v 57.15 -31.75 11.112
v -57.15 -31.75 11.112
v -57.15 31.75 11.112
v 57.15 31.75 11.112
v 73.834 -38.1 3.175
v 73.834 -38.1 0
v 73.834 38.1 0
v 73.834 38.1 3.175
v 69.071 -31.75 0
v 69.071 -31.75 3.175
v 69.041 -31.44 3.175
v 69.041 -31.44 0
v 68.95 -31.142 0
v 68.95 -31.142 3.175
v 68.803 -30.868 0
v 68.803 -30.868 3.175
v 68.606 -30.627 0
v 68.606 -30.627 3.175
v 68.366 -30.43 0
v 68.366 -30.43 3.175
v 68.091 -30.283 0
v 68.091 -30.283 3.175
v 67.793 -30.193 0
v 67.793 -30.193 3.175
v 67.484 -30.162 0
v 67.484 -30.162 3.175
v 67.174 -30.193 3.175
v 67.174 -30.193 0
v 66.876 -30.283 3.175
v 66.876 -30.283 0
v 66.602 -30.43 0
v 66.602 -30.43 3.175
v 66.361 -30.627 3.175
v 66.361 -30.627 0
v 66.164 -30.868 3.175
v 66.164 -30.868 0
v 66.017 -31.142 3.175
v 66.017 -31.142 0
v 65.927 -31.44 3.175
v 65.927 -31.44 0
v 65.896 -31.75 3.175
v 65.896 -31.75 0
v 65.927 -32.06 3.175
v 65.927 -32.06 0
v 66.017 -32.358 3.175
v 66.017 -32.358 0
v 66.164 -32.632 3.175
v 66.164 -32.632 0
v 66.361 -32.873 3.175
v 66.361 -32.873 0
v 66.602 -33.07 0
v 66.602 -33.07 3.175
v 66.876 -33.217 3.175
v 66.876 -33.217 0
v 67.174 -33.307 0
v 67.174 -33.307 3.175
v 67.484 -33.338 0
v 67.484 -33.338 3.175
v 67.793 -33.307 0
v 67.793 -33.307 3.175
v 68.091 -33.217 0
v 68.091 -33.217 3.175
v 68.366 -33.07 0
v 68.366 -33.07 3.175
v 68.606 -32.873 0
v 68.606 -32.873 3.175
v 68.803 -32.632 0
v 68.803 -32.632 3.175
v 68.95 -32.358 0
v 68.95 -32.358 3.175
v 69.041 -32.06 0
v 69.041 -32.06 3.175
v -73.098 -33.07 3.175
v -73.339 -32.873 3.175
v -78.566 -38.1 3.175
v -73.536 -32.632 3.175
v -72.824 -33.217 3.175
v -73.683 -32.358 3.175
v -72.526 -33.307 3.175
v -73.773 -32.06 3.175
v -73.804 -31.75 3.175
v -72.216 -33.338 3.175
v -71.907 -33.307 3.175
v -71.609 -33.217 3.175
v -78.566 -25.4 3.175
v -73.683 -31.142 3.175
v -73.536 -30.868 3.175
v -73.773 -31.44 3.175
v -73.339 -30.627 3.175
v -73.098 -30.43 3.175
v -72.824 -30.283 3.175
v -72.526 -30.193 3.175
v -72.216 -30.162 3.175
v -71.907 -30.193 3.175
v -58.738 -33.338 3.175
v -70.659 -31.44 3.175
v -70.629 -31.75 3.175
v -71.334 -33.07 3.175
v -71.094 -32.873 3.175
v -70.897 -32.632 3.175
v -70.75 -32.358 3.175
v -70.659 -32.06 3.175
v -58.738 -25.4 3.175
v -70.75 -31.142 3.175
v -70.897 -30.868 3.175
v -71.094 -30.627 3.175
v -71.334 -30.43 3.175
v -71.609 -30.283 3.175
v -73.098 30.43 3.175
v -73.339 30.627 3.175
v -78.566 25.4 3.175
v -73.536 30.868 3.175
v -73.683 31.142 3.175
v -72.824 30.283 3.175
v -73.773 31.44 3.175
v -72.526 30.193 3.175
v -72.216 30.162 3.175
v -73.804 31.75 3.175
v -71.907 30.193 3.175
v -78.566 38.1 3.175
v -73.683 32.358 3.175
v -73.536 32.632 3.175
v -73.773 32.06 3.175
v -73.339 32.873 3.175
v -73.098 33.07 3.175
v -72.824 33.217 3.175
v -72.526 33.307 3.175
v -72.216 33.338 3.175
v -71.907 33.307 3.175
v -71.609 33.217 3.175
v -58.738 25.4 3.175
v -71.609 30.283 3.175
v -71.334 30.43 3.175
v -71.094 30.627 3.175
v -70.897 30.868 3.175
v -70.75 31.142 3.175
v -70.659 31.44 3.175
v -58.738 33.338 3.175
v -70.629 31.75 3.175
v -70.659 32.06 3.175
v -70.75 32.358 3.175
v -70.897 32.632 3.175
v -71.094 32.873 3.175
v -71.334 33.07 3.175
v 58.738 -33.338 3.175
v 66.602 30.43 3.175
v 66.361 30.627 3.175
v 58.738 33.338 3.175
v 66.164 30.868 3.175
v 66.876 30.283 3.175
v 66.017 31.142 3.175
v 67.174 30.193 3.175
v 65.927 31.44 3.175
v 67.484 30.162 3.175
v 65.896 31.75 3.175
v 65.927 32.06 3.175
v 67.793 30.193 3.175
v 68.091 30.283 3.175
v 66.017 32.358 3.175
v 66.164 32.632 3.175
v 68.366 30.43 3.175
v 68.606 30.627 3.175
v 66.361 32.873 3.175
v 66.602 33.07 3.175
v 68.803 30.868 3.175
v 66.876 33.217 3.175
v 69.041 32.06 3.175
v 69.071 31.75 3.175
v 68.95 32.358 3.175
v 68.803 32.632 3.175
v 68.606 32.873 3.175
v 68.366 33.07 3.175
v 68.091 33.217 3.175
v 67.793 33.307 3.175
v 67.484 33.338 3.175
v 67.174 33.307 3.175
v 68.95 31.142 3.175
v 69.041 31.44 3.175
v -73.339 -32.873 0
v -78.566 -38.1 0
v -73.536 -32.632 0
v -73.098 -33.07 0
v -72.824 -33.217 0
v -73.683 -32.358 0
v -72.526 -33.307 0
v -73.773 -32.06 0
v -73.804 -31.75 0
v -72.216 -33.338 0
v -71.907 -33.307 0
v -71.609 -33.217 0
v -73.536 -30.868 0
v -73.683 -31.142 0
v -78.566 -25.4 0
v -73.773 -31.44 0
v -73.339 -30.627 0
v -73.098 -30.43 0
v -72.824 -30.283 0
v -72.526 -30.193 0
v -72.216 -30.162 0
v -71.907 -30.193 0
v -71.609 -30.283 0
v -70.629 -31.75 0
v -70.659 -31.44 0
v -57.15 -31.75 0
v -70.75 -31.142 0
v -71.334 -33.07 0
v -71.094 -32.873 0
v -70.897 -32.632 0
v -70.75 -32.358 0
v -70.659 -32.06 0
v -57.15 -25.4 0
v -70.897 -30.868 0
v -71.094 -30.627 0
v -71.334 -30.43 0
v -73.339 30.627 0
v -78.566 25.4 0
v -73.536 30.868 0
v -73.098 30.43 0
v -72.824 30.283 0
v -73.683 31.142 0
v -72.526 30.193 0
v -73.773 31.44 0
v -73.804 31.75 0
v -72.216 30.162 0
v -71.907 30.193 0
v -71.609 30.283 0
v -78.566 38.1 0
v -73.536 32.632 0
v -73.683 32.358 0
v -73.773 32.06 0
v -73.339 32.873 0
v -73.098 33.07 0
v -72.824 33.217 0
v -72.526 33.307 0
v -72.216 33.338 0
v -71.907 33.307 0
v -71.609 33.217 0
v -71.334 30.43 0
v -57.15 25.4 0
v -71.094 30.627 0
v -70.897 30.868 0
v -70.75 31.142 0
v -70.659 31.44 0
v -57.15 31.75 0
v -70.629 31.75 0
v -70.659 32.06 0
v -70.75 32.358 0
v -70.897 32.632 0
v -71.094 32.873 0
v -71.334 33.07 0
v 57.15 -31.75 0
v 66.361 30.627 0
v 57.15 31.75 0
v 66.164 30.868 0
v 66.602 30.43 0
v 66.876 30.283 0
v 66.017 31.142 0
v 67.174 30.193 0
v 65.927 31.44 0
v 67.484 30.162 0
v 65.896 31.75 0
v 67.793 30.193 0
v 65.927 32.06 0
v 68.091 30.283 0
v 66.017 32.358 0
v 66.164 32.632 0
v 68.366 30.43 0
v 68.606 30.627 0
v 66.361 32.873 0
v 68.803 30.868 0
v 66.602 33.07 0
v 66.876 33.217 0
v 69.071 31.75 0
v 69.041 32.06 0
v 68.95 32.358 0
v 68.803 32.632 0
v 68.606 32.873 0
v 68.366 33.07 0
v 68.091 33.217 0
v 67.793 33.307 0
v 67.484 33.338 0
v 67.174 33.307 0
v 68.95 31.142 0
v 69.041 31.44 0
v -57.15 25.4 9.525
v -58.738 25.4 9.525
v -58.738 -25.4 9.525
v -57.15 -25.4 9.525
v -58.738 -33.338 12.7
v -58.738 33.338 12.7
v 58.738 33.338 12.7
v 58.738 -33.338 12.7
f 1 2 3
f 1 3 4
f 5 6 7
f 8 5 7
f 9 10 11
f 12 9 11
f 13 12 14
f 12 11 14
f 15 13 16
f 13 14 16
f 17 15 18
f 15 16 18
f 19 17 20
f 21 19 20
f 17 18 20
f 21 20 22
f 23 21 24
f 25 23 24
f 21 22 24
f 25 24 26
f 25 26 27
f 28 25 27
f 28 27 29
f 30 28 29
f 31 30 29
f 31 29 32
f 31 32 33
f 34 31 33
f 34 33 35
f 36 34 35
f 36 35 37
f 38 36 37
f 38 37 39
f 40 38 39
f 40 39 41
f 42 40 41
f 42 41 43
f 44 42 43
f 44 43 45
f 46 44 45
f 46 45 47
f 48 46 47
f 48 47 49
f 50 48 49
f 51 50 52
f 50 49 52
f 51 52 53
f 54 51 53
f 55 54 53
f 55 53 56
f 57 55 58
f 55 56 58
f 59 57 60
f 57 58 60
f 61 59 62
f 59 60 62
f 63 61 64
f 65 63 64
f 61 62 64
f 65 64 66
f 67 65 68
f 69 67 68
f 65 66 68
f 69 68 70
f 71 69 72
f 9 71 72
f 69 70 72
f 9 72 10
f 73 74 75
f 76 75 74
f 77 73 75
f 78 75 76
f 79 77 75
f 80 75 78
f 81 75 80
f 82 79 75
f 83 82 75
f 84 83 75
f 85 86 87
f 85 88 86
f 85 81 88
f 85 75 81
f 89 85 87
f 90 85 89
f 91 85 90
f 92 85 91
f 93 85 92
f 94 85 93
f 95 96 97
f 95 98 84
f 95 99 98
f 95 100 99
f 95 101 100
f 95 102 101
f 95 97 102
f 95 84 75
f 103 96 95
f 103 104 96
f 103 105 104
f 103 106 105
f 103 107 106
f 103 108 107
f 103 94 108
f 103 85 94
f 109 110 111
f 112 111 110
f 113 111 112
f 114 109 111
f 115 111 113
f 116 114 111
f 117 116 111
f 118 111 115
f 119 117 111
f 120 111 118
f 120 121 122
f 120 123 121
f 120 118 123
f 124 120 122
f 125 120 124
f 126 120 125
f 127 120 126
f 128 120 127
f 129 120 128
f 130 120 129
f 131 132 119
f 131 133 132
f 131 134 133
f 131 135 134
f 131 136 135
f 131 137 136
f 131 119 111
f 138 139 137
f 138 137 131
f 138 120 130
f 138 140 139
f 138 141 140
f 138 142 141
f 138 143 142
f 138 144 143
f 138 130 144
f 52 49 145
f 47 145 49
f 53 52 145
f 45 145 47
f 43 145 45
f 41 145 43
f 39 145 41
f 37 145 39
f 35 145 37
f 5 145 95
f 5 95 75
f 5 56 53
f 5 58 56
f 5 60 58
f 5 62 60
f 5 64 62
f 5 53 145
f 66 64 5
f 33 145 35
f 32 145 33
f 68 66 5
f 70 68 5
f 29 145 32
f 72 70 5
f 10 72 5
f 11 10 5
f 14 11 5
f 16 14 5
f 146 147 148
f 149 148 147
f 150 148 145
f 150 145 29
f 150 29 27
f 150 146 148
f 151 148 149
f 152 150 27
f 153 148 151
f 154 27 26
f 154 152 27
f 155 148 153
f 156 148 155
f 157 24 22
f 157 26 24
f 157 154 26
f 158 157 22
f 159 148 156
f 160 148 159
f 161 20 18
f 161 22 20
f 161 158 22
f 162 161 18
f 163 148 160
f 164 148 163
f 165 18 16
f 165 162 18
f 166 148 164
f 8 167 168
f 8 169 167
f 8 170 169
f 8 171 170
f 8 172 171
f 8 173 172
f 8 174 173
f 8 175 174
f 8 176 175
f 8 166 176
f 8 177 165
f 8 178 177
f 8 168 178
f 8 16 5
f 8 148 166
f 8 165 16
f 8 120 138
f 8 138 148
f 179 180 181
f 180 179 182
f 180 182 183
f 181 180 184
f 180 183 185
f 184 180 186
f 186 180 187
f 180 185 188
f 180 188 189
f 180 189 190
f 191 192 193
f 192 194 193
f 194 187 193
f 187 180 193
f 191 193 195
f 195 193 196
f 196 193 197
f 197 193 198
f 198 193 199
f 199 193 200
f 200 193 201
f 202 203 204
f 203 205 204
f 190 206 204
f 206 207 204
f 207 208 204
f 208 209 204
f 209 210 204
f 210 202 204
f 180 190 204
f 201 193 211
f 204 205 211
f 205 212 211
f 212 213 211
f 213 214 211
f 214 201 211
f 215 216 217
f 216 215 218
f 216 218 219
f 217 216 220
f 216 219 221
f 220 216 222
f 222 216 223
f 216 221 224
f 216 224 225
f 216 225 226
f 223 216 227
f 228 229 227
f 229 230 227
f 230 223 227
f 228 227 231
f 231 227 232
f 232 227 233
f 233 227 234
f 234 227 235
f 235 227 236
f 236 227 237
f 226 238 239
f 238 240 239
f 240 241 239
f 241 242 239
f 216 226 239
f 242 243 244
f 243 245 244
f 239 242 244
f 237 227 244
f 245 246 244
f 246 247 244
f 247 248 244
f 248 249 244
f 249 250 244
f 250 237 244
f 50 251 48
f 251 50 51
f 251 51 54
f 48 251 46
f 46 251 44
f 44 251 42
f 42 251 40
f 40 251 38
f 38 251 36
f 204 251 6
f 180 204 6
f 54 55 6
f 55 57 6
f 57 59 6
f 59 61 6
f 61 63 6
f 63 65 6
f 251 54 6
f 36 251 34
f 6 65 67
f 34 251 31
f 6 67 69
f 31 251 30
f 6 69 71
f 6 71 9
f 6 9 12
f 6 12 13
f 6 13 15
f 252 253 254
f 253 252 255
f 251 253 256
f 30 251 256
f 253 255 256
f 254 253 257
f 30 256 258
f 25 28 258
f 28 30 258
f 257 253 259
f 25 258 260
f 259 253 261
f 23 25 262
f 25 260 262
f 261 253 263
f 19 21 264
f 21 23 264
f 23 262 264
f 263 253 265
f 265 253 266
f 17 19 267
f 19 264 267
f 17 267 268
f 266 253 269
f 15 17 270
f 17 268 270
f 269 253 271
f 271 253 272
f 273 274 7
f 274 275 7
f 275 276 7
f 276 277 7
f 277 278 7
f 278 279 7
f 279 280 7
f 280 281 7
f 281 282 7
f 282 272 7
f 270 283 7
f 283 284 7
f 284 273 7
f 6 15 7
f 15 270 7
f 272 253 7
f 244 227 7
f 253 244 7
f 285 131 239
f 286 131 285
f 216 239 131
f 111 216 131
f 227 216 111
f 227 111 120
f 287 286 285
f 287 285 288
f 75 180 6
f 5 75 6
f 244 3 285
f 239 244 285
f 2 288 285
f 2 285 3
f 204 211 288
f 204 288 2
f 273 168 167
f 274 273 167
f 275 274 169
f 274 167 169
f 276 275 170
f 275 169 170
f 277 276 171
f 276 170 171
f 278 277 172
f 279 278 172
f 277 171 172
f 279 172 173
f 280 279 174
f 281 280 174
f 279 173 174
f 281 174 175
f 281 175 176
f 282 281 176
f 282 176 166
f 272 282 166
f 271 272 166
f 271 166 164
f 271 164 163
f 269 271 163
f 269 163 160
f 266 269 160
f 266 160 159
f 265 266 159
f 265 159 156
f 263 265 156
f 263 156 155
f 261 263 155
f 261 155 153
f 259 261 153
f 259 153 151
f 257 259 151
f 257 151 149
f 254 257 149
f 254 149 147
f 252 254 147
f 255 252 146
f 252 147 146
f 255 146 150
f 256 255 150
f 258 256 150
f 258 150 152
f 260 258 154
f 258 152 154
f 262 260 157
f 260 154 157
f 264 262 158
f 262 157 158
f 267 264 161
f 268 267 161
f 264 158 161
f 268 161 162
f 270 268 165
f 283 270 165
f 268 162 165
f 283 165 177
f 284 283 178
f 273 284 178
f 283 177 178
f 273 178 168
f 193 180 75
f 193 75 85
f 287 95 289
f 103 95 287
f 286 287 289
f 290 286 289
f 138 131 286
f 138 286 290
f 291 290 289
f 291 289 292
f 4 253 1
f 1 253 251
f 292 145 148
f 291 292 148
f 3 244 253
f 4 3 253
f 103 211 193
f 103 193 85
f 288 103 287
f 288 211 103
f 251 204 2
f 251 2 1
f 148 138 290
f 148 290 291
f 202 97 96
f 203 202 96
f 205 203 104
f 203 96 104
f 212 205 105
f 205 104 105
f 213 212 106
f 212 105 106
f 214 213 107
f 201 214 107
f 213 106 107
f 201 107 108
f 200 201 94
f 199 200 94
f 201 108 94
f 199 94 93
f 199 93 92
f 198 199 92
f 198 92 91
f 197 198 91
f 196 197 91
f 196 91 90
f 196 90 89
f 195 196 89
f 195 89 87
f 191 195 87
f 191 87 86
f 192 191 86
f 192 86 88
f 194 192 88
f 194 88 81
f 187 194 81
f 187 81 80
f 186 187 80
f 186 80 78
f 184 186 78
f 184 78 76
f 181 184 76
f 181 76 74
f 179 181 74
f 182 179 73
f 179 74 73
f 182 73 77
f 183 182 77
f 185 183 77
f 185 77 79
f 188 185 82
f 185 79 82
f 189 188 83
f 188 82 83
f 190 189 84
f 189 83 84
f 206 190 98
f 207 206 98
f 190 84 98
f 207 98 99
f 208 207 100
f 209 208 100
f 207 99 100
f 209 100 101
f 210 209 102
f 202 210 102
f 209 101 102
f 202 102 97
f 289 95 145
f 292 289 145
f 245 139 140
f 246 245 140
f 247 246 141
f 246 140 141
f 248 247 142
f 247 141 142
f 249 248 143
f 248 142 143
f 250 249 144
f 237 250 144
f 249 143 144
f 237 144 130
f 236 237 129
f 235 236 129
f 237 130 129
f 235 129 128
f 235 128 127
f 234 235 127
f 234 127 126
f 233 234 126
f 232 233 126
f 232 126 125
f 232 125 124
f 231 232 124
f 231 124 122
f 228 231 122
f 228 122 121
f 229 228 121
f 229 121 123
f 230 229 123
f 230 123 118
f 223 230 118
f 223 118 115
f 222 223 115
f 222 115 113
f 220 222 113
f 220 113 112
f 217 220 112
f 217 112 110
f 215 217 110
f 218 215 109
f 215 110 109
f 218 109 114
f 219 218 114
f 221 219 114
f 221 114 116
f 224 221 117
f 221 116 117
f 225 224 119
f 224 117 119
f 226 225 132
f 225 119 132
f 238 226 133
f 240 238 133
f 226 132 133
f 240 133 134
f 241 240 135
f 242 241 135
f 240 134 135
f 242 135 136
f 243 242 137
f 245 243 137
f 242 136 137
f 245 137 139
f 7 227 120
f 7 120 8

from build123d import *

# Parameters (mm, degrees)
F0_W          = 152.4
F0_H          = 76.2
F1_DEPTH      = 3.175
F2_W          = 117.475
F2_H          = 66.675
F3_DEPTH      = 9.525
F4_W          = 114.3
F4_H          = 63.5
F5_DEPTH      = 11.1125
F6_W          = 50.8
F6_H          = 9.525
F7_DEPTH      = 25.4
F7_DEPTH_BACK = 25.4
F8_R          = 1.5875
F9_DEPTH      = 25.4


with BuildPart() as f1:
    # F0 (on Top) → F1 (new body)
    with BuildSketch(Plane.XY):
        with Locations((-2.3664589537, 0)):
            Rectangle(F0_W, F0_H)
    extrude(amount=F1_DEPTH)

    # F2 (on face) → F3 (join)
    with BuildSketch(Plane.XY.offset(3.175)):
        Rectangle(F2_W, F2_H)
    extrude(amount=F3_DEPTH)

    # F4 (on face) → F5 (cut)
    with BuildSketch(Plane(origin=(0, 0, 0), x_dir=(1, 0, 0), z_dir=(0, 0, -1))):
        Rectangle(F4_W, F4_H)
    extrude(amount=-F5_DEPTH, mode=Mode.SUBTRACT)

    # F6 (on face) → F7 (cut, two sides)
    with BuildSketch(Plane(origin=(-58.7375, 0, 0), x_dir=(0, -1, 0), z_dir=(-1, 0, 0))) as f7_sk:
        with Locations((0, 4.7625)):
            Rectangle(F6_W, F6_H)
    extrude(amount=-F7_DEPTH, mode=Mode.SUBTRACT)
    extrude(f7_sk.sketch, amount=F7_DEPTH_BACK, mode=Mode.SUBTRACT)

    # F8 (on face) → F9 (cut)
    with BuildSketch(Plane.XY.offset(3.175)):
        with Locations((-72.2164589537, 31.75)):
            Circle(F8_R)
        with Locations((-72.2164589537, -31.75)):
            Circle(F8_R)
        with Locations((67.4835410463, 31.75)):
            Circle(F8_R)
        with Locations((67.4835410463, -31.75)):
            Circle(F8_R)
    extrude(amount=-F9_DEPTH, mode=Mode.SUBTRACT)


solid = f1.part
